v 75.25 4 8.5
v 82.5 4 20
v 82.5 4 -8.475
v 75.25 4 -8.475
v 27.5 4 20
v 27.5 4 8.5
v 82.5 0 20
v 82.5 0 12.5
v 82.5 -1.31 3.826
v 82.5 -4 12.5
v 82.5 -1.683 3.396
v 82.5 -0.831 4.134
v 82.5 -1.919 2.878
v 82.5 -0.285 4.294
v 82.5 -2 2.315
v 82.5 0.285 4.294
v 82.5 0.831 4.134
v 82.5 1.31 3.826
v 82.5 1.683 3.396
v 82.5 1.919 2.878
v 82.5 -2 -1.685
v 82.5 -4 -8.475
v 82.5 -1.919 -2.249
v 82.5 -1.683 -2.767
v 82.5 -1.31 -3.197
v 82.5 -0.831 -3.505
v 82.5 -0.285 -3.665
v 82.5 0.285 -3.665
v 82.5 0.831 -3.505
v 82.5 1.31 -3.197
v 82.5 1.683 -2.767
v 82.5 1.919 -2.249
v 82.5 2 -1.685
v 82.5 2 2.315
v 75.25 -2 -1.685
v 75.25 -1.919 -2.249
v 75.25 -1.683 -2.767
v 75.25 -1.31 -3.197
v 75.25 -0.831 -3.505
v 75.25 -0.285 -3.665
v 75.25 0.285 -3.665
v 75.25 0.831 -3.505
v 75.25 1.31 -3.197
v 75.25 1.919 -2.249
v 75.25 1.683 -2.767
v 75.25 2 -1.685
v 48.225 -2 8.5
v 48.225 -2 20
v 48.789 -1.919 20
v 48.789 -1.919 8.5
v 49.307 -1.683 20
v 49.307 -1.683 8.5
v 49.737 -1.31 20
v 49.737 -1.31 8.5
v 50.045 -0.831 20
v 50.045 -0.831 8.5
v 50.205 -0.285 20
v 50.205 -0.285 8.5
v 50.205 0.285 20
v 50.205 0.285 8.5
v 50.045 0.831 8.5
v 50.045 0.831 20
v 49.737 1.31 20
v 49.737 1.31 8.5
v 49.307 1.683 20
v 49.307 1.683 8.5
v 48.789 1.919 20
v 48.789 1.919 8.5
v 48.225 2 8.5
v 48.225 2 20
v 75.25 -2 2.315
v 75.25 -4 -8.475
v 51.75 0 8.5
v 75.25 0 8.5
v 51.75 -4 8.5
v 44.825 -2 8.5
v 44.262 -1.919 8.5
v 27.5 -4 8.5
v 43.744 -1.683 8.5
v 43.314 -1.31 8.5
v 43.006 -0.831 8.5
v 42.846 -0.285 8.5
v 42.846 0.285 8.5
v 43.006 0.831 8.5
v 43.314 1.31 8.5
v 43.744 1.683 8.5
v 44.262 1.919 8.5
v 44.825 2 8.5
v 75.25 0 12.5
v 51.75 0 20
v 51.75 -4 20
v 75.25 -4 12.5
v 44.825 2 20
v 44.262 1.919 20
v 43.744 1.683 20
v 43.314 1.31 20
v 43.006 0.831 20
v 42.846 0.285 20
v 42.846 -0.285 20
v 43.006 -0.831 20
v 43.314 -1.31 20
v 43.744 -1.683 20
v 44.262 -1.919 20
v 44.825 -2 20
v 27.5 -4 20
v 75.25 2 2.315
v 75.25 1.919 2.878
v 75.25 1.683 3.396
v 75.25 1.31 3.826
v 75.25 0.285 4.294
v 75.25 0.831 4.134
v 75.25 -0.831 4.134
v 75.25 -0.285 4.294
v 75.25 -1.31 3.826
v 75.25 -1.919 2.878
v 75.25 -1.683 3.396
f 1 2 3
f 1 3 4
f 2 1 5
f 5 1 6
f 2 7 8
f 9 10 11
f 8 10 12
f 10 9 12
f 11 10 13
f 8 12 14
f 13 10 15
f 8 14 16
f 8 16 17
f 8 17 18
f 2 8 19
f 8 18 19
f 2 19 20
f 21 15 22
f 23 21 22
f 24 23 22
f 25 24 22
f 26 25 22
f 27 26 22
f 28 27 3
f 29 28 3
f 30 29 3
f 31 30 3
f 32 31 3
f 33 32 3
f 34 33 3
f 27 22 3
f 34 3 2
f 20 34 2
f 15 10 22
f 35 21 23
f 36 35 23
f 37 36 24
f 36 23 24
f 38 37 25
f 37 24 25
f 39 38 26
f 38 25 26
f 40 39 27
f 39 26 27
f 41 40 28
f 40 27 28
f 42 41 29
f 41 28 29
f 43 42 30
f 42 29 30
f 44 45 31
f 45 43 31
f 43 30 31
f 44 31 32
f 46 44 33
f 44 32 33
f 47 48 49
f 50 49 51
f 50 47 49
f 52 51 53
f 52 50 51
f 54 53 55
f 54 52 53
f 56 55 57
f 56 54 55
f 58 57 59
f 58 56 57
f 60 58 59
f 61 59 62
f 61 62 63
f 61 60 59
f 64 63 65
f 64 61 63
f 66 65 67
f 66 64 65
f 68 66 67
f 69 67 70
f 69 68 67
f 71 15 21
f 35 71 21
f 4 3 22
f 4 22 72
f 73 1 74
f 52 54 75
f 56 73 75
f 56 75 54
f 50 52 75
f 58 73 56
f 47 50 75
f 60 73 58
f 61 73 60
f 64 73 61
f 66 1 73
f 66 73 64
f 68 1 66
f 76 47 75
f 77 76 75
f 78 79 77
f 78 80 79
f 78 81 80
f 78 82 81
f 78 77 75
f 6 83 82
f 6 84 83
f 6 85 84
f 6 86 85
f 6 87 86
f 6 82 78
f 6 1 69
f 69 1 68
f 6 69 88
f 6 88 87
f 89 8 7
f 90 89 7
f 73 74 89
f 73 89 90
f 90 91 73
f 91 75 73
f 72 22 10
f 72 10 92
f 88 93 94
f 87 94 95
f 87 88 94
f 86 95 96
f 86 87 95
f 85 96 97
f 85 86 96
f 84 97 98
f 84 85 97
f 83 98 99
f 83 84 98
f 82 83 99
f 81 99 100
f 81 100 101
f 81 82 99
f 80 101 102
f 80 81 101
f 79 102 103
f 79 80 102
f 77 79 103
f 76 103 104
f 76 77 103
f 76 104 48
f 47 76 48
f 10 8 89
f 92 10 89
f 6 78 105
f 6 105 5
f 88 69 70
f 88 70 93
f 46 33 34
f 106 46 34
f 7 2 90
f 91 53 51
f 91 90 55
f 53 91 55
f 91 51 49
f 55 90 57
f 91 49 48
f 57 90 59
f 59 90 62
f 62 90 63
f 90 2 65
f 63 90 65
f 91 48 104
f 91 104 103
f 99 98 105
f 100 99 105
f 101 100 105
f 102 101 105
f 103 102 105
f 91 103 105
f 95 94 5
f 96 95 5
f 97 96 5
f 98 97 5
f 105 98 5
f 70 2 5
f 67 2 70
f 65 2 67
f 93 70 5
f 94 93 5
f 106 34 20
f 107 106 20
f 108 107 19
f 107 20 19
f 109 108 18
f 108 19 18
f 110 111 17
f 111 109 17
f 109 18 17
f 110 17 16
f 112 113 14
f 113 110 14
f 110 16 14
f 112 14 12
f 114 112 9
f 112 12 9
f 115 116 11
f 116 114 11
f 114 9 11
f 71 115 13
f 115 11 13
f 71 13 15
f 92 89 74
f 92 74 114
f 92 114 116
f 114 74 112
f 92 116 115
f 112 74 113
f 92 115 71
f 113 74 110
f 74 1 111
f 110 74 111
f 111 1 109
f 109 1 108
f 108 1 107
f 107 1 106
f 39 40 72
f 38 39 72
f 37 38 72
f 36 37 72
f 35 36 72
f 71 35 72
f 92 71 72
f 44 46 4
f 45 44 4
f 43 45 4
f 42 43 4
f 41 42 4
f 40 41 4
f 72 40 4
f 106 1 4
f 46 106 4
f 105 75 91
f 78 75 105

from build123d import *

# Parameters (mm, degrees)
SKETCH1_W                = 55
SKETCH1_H                = 25
BOSS_EXTRUDE1_DEPTH      = 4
SKETCH5_W                = 40.5
SKETCH5_H                = 17
CUT_EXTRUDE2_DEPTH       = 5
SKETCH6_W                = 55
SKETCH6_H                = 4.025345596
CUT_EXTRUDE3_DEPTH       = 5
SKETCH13_W               = 7.25
SKETCH13_H               = 20.974654404
BOSS_EXTRUDE3_DEPTH      = 8
SKETCH16_W               = 7.25
SKETCH16_H               = 20.974654404
BOSS_EXTRUDE4_DEPTH      = 8
SKETCH19_W               = 17
SKETCH19_H               = 4
BOSS_EXTRUDE5_DEPTH      = 4
SKETCH30_W               = 55
SKETCH30_H               = 4
BOSS_EXTRUDE6_DEPTH      = 7.5
SKETCH31_W               = 24.25
SKETCH31_H               = 4
BOSS_EXTRUDE7_DEPTH      = 7.5
SKETCH21_W               = 7.25
SKETCH21_H               = 16.974654404
CUT_EXTRUDE7_DEPTH       = 9
CUT_EXTRUDE9_DEPTH       = 56
CUT_EXTRUDE14_DEPTH      = 8.5
CUT_EXTRUDE14_DEPTH_BACK = 21.974654404


with BuildPart() as part:
    # Sketch1 → Boss-Extrude1 (new body)
    with BuildSketch(Plane(origin=(0, 0, 0), x_dir=(1, 0, 0), z_dir=(0, 1, 0))):
        Rectangle(SKETCH1_W, SKETCH1_H)
    extrude(amount=BOSS_EXTRUDE1_DEPTH)

    # Sketch5 → Cut-Extrude2 (cut, through all)
    with BuildSketch(Plane(origin=(0, 4, 0), x_dir=(1, 0, 0), z_dir=(0, 1, 0))):
        Rectangle(SKETCH5_W, SKETCH5_H)
    extrude(amount=-CUT_EXTRUDE2_DEPTH, mode=Mode.SUBTRACT)

    # Sketch6 → Cut-Extrude3 (cut, through all)
    with BuildSketch(Plane(origin=(0, 4, 0), x_dir=(1, 0, 0), z_dir=(0, 1, 0))):
        with Locations((0, 10.487327202)):
            Rectangle(SKETCH6_W, SKETCH6_H)
    extrude(amount=-CUT_EXTRUDE3_DEPTH, mode=Mode.SUBTRACT)

    # Sketch13 → Boss-Extrude3 (add)
    with BuildSketch(Plane(origin=(0, 4, 0), x_dir=(1, 0, 0), z_dir=(0, 1, 0))):
        with Locations((23.875, -2.012672798)):
            Rectangle(SKETCH13_W, SKETCH13_H)
    extrude(amount=-BOSS_EXTRUDE3_DEPTH)

    # Sketch16 → Boss-Extrude4 (add)
    with BuildSketch(Plane(origin=(0, 4, 0), x_dir=(1, 0, 0), z_dir=(0, 1, 0))):
        with Locations((-23.875, -2.012672798)):
            Rectangle(SKETCH16_W, SKETCH16_H)
    extrude(amount=-BOSS_EXTRUDE4_DEPTH)

    # Sketch19 → Boss-Extrude5 (add)
    with BuildSketch(Plane.XZ):
        with Locations((11.75, 10.5)):
            Rectangle(SKETCH19_W, SKETCH19_H)
    extrude(amount=BOSS_EXTRUDE5_DEPTH)

    # Sketch30 → Boss-Extrude6 (add)
    with BuildSketch(Plane.XY.offset(12.5)):
        with Locations((0, 2)):
            Rectangle(SKETCH30_W, SKETCH30_H)
    extrude(amount=BOSS_EXTRUDE6_DEPTH)

    # Sketch31 → Boss-Extrude7 (add)
    with BuildSketch(Plane.XY.offset(12.5)):
        with Locations((15.375, -2)):
            Rectangle(SKETCH31_W, SKETCH31_H)
    extrude(amount=BOSS_EXTRUDE7_DEPTH)

    # Sketch21 → Cut-Extrude7 (cut, through all)
    with BuildSketch(Plane(origin=(0, 4, 0), x_dir=(1, 0, 0), z_dir=(0, 1, 0))):
        with Locations((23.875, -0.012672798)):
            Rectangle(SKETCH21_W, SKETCH21_H)
    extrude(amount=-CUT_EXTRUDE7_DEPTH, mode=Mode.SUBTRACT)

    # Sketch25 → Cut-Extrude9 (cut, through all)
    with BuildSketch(Plane.ZY.offset(27.5)):
        with BuildLine():
            Line((2.314549123, -2), (-1.685450877, -2))
            ThreePointArc((-1.685450877, -2), (-3.685450877, 0), (-1.685450877, 2))
            Line((-1.685450877, 2), (2.314549123, 2))
            ThreePointArc((2.314549123, 2), (4.314549123, 0), (2.314549123, -2))
        make_face()
    extrude(amount=-CUT_EXTRUDE9_DEPTH, mode=Mode.SUBTRACT)

    # Sketch29 → Cut-Extrude14 (cut, two sides)
    with BuildSketch(Plane.XY.offset(12.5)) as cut_extrude14_sk:
        with BuildLine():
            Line((6.774762471, 2), (10.174762471, 2))
            ThreePointArc((10.174762471, 2), (12.174762471, 0), (10.174762471, -2))
            Line((10.174762471, -2), (6.774762471, -2))
            ThreePointArc((6.774762471, -2), (4.774762471, 0), (6.774762471, 2))
        make_face()
    extrude(amount=CUT_EXTRUDE14_DEPTH, mode=Mode.SUBTRACT)
    extrude(cut_extrude14_sk.sketch, amount=-CUT_EXTRUDE14_DEPTH_BACK, mode=Mode.SUBTRACT)


with BuildPart() as body_2:
    # Mirror1: mirrored copy
    add(part.part.mirror(Plane(origin=(27.5, 0, 14.25), x_dir=(0, 0, 1), z_dir=(1, 0, 0))))


solid = body_2.part
